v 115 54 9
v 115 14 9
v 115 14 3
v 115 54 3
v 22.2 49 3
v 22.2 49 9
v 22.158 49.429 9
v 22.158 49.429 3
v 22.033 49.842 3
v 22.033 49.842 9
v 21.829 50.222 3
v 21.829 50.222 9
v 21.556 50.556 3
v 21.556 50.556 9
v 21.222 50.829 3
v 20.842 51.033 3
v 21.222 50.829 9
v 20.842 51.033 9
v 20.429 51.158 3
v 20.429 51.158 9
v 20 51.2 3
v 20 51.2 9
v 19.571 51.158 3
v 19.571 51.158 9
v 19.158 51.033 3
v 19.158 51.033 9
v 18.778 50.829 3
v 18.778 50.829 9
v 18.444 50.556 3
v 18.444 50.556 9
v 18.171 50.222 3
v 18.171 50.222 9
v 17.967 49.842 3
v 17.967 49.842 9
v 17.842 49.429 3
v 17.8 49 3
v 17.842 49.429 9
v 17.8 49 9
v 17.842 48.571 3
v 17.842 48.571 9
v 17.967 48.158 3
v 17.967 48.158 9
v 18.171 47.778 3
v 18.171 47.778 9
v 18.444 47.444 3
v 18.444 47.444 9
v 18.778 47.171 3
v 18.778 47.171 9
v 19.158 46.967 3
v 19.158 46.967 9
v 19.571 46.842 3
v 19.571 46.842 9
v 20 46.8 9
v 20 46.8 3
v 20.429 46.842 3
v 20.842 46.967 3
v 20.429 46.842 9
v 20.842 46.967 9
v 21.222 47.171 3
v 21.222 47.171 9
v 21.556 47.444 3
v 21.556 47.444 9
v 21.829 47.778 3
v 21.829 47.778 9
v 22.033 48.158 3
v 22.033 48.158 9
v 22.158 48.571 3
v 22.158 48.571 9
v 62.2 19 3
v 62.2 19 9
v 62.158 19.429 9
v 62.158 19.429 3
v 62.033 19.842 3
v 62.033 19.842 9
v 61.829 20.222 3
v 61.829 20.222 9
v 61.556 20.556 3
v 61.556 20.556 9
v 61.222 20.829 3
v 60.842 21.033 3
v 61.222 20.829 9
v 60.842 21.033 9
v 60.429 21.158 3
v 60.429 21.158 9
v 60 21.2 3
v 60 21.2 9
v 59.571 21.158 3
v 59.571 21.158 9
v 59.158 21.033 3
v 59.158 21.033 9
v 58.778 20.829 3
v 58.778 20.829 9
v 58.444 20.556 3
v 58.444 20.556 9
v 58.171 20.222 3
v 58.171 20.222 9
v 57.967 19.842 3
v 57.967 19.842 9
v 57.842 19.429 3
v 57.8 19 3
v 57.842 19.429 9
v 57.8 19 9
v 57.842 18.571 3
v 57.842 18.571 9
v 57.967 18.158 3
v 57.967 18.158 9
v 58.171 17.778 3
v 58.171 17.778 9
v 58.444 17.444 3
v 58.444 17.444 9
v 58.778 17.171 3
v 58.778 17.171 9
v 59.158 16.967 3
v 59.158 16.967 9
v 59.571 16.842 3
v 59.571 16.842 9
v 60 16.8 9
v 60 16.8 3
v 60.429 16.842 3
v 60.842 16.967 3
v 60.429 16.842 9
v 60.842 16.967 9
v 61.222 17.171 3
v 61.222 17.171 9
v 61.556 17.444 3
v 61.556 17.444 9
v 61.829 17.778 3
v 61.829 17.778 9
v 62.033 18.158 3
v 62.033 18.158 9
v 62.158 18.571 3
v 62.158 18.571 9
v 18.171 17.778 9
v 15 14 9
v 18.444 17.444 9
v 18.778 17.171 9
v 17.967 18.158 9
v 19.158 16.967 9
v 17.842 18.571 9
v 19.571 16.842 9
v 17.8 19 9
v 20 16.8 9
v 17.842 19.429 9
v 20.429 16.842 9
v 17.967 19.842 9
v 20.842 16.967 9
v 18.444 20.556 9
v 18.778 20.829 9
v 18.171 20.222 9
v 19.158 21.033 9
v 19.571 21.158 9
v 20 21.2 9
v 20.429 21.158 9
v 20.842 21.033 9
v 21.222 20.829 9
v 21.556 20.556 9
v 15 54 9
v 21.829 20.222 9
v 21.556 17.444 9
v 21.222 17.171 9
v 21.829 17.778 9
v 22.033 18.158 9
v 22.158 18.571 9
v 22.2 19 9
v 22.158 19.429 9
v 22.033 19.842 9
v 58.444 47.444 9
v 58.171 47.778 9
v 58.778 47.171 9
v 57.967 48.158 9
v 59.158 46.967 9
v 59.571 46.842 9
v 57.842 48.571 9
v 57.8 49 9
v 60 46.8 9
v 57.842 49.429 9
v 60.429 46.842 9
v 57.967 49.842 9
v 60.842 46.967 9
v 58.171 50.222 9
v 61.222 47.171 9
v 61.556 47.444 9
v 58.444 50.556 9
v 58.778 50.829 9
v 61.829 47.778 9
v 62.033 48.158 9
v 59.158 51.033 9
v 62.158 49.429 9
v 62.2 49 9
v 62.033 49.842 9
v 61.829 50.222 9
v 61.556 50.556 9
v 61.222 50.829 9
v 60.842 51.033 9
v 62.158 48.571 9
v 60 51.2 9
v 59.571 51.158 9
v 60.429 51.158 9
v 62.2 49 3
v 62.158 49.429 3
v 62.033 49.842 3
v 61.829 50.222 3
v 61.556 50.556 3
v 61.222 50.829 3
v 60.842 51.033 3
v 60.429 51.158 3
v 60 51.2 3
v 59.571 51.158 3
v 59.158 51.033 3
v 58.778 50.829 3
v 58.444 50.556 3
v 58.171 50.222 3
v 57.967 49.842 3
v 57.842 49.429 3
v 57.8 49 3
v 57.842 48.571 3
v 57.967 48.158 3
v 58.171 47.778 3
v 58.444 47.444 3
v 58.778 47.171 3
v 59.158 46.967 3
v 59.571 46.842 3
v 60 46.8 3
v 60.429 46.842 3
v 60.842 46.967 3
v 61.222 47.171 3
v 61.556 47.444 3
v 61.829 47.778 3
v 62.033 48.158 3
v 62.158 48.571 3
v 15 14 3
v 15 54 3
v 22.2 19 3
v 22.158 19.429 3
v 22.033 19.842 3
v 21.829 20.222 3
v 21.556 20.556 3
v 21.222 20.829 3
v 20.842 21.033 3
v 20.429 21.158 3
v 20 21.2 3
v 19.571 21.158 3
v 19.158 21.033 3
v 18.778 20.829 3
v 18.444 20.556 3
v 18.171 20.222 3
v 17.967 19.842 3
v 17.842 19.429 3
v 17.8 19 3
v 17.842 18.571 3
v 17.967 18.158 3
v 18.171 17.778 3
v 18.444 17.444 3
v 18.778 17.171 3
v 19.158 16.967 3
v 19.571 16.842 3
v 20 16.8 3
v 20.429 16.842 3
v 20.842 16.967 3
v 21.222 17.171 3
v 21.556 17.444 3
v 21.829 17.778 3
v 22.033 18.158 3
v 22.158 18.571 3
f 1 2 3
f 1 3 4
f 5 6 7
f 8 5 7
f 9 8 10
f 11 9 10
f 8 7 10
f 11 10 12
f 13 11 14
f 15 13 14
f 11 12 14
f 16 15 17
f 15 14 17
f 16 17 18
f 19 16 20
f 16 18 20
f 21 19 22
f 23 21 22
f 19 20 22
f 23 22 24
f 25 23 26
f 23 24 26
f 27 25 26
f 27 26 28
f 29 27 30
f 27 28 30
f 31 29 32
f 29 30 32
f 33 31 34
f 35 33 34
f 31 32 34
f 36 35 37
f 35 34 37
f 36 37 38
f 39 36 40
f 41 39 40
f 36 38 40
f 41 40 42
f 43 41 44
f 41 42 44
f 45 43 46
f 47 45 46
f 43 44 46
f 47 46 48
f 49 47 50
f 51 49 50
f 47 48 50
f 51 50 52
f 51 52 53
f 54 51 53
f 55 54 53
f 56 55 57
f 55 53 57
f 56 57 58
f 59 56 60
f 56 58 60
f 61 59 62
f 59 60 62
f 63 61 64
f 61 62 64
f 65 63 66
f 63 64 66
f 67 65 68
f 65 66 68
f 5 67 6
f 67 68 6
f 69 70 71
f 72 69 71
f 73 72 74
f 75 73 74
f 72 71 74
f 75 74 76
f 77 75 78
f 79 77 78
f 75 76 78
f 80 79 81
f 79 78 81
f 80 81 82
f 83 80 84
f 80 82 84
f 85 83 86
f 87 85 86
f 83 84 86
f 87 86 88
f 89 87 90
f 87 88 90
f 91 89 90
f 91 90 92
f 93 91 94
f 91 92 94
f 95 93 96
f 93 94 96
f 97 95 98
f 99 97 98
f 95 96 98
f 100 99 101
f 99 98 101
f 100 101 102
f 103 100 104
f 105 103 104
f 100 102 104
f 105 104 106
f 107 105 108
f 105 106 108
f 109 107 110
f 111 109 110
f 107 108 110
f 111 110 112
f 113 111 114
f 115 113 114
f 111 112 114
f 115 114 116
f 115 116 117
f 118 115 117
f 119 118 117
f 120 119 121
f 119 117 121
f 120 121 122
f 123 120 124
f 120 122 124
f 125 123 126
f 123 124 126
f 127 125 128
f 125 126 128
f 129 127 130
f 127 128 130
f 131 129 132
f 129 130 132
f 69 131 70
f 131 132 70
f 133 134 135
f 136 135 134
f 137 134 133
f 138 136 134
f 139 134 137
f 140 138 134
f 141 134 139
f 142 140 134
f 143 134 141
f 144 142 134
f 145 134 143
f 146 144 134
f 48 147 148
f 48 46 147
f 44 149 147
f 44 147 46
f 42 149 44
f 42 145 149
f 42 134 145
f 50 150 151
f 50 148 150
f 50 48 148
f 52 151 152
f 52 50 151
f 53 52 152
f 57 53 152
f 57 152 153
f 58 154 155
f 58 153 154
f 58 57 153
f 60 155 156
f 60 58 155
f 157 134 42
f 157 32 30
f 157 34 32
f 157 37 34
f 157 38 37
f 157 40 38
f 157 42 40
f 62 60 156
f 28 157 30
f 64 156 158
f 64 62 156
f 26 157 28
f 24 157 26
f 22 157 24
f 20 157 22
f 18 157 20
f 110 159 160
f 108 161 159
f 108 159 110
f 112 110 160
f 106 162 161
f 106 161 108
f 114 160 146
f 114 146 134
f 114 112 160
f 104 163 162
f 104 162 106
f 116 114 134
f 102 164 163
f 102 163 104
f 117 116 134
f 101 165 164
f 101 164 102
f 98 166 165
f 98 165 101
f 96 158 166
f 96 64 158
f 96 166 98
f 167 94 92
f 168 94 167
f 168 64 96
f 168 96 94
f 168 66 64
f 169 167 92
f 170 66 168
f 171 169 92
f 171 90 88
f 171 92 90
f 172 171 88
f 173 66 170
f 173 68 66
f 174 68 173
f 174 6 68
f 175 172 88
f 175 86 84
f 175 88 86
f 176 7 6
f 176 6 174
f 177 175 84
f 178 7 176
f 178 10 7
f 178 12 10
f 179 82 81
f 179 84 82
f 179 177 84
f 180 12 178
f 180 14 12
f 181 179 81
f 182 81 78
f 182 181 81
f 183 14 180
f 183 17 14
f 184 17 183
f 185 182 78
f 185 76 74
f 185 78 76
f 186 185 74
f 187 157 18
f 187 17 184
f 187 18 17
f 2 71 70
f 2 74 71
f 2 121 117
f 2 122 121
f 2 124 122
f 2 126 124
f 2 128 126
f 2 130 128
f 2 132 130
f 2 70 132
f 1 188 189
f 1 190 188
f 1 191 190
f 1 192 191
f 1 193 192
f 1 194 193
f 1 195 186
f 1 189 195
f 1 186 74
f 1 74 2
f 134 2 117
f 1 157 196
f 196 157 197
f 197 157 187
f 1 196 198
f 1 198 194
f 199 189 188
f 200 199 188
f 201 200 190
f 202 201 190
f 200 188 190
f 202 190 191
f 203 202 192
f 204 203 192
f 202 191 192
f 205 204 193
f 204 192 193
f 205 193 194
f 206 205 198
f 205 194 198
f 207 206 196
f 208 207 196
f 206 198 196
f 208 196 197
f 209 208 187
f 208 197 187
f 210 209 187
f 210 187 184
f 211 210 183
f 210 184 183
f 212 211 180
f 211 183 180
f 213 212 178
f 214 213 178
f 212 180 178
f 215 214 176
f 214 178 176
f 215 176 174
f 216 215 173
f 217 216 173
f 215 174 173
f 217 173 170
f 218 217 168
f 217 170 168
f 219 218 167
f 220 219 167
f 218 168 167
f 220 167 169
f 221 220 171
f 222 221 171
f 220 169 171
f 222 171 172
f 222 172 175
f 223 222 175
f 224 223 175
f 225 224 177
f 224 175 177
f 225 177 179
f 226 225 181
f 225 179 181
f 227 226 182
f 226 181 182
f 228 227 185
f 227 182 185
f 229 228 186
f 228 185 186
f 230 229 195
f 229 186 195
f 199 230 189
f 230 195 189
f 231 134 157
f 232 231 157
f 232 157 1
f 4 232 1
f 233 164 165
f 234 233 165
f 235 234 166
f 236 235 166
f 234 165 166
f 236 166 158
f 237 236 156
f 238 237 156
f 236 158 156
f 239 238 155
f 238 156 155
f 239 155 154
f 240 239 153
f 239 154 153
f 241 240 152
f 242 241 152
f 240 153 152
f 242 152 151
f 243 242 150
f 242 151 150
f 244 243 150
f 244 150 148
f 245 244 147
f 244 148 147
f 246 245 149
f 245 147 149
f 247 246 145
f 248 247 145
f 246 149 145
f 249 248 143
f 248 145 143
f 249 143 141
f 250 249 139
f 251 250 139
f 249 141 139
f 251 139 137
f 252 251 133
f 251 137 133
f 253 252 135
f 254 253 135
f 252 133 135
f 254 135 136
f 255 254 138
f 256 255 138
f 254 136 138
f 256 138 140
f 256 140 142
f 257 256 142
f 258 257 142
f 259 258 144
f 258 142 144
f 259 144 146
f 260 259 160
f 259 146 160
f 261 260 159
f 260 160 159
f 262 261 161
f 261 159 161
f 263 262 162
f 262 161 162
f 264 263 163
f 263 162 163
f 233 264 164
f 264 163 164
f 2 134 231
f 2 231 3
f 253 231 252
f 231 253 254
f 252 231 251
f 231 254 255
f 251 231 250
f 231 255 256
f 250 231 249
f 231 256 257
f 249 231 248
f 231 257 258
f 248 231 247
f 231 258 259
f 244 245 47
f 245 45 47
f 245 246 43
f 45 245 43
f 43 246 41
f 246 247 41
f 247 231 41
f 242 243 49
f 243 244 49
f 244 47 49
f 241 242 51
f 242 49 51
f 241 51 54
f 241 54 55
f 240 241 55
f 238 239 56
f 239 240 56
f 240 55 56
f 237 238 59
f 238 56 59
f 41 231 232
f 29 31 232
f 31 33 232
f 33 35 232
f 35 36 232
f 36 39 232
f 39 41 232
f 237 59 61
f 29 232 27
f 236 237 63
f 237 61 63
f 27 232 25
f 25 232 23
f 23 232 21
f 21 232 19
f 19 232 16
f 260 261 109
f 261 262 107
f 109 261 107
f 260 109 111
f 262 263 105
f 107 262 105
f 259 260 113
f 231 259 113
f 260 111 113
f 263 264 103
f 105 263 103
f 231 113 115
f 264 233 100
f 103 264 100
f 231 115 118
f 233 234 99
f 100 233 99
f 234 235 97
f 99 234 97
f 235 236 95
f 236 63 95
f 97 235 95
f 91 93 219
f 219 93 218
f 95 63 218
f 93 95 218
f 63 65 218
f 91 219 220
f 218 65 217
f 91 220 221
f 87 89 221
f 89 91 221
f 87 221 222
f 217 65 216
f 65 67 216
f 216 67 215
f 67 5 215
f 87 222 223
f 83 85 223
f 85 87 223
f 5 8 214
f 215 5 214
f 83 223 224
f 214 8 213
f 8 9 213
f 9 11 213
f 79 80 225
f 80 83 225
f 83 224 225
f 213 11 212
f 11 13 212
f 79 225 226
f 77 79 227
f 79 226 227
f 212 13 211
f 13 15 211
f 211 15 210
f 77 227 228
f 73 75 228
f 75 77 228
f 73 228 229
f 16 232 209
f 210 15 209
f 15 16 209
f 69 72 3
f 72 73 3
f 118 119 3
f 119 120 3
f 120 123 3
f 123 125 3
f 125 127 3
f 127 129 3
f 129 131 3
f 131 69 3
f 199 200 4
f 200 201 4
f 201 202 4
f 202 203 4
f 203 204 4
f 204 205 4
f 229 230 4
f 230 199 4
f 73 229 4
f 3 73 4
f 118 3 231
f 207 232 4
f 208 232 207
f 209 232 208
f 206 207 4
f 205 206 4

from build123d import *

# Parameters (mm, degrees)
SKETCH1_W           = 100
SKETCH1_H           = 40
SKETCH1_R           = 2.2
BOSS_EXTRUDE1_DEPTH = 6


with BuildPart() as part:
    # Sketch1 → Boss-Extrude1 (new body)
    with BuildSketch(Plane.XY.offset(9)):
        with Locations((65, 34)):
            Rectangle(SKETCH1_W, SKETCH1_H)
        with Locations((60, 49)):
            Circle(SKETCH1_R, mode=Mode.SUBTRACT)
        with Locations((20, 19)):
            Circle(SKETCH1_R, mode=Mode.SUBTRACT)
        with Locations((20, 49)):
            Circle(SKETCH1_R, mode=Mode.SUBTRACT)
        with Locations((60, 19)):
            Circle(SKETCH1_R, mode=Mode.SUBTRACT)
    extrude(amount=-BOSS_EXTRUDE1_DEPTH)


solid = part.part
